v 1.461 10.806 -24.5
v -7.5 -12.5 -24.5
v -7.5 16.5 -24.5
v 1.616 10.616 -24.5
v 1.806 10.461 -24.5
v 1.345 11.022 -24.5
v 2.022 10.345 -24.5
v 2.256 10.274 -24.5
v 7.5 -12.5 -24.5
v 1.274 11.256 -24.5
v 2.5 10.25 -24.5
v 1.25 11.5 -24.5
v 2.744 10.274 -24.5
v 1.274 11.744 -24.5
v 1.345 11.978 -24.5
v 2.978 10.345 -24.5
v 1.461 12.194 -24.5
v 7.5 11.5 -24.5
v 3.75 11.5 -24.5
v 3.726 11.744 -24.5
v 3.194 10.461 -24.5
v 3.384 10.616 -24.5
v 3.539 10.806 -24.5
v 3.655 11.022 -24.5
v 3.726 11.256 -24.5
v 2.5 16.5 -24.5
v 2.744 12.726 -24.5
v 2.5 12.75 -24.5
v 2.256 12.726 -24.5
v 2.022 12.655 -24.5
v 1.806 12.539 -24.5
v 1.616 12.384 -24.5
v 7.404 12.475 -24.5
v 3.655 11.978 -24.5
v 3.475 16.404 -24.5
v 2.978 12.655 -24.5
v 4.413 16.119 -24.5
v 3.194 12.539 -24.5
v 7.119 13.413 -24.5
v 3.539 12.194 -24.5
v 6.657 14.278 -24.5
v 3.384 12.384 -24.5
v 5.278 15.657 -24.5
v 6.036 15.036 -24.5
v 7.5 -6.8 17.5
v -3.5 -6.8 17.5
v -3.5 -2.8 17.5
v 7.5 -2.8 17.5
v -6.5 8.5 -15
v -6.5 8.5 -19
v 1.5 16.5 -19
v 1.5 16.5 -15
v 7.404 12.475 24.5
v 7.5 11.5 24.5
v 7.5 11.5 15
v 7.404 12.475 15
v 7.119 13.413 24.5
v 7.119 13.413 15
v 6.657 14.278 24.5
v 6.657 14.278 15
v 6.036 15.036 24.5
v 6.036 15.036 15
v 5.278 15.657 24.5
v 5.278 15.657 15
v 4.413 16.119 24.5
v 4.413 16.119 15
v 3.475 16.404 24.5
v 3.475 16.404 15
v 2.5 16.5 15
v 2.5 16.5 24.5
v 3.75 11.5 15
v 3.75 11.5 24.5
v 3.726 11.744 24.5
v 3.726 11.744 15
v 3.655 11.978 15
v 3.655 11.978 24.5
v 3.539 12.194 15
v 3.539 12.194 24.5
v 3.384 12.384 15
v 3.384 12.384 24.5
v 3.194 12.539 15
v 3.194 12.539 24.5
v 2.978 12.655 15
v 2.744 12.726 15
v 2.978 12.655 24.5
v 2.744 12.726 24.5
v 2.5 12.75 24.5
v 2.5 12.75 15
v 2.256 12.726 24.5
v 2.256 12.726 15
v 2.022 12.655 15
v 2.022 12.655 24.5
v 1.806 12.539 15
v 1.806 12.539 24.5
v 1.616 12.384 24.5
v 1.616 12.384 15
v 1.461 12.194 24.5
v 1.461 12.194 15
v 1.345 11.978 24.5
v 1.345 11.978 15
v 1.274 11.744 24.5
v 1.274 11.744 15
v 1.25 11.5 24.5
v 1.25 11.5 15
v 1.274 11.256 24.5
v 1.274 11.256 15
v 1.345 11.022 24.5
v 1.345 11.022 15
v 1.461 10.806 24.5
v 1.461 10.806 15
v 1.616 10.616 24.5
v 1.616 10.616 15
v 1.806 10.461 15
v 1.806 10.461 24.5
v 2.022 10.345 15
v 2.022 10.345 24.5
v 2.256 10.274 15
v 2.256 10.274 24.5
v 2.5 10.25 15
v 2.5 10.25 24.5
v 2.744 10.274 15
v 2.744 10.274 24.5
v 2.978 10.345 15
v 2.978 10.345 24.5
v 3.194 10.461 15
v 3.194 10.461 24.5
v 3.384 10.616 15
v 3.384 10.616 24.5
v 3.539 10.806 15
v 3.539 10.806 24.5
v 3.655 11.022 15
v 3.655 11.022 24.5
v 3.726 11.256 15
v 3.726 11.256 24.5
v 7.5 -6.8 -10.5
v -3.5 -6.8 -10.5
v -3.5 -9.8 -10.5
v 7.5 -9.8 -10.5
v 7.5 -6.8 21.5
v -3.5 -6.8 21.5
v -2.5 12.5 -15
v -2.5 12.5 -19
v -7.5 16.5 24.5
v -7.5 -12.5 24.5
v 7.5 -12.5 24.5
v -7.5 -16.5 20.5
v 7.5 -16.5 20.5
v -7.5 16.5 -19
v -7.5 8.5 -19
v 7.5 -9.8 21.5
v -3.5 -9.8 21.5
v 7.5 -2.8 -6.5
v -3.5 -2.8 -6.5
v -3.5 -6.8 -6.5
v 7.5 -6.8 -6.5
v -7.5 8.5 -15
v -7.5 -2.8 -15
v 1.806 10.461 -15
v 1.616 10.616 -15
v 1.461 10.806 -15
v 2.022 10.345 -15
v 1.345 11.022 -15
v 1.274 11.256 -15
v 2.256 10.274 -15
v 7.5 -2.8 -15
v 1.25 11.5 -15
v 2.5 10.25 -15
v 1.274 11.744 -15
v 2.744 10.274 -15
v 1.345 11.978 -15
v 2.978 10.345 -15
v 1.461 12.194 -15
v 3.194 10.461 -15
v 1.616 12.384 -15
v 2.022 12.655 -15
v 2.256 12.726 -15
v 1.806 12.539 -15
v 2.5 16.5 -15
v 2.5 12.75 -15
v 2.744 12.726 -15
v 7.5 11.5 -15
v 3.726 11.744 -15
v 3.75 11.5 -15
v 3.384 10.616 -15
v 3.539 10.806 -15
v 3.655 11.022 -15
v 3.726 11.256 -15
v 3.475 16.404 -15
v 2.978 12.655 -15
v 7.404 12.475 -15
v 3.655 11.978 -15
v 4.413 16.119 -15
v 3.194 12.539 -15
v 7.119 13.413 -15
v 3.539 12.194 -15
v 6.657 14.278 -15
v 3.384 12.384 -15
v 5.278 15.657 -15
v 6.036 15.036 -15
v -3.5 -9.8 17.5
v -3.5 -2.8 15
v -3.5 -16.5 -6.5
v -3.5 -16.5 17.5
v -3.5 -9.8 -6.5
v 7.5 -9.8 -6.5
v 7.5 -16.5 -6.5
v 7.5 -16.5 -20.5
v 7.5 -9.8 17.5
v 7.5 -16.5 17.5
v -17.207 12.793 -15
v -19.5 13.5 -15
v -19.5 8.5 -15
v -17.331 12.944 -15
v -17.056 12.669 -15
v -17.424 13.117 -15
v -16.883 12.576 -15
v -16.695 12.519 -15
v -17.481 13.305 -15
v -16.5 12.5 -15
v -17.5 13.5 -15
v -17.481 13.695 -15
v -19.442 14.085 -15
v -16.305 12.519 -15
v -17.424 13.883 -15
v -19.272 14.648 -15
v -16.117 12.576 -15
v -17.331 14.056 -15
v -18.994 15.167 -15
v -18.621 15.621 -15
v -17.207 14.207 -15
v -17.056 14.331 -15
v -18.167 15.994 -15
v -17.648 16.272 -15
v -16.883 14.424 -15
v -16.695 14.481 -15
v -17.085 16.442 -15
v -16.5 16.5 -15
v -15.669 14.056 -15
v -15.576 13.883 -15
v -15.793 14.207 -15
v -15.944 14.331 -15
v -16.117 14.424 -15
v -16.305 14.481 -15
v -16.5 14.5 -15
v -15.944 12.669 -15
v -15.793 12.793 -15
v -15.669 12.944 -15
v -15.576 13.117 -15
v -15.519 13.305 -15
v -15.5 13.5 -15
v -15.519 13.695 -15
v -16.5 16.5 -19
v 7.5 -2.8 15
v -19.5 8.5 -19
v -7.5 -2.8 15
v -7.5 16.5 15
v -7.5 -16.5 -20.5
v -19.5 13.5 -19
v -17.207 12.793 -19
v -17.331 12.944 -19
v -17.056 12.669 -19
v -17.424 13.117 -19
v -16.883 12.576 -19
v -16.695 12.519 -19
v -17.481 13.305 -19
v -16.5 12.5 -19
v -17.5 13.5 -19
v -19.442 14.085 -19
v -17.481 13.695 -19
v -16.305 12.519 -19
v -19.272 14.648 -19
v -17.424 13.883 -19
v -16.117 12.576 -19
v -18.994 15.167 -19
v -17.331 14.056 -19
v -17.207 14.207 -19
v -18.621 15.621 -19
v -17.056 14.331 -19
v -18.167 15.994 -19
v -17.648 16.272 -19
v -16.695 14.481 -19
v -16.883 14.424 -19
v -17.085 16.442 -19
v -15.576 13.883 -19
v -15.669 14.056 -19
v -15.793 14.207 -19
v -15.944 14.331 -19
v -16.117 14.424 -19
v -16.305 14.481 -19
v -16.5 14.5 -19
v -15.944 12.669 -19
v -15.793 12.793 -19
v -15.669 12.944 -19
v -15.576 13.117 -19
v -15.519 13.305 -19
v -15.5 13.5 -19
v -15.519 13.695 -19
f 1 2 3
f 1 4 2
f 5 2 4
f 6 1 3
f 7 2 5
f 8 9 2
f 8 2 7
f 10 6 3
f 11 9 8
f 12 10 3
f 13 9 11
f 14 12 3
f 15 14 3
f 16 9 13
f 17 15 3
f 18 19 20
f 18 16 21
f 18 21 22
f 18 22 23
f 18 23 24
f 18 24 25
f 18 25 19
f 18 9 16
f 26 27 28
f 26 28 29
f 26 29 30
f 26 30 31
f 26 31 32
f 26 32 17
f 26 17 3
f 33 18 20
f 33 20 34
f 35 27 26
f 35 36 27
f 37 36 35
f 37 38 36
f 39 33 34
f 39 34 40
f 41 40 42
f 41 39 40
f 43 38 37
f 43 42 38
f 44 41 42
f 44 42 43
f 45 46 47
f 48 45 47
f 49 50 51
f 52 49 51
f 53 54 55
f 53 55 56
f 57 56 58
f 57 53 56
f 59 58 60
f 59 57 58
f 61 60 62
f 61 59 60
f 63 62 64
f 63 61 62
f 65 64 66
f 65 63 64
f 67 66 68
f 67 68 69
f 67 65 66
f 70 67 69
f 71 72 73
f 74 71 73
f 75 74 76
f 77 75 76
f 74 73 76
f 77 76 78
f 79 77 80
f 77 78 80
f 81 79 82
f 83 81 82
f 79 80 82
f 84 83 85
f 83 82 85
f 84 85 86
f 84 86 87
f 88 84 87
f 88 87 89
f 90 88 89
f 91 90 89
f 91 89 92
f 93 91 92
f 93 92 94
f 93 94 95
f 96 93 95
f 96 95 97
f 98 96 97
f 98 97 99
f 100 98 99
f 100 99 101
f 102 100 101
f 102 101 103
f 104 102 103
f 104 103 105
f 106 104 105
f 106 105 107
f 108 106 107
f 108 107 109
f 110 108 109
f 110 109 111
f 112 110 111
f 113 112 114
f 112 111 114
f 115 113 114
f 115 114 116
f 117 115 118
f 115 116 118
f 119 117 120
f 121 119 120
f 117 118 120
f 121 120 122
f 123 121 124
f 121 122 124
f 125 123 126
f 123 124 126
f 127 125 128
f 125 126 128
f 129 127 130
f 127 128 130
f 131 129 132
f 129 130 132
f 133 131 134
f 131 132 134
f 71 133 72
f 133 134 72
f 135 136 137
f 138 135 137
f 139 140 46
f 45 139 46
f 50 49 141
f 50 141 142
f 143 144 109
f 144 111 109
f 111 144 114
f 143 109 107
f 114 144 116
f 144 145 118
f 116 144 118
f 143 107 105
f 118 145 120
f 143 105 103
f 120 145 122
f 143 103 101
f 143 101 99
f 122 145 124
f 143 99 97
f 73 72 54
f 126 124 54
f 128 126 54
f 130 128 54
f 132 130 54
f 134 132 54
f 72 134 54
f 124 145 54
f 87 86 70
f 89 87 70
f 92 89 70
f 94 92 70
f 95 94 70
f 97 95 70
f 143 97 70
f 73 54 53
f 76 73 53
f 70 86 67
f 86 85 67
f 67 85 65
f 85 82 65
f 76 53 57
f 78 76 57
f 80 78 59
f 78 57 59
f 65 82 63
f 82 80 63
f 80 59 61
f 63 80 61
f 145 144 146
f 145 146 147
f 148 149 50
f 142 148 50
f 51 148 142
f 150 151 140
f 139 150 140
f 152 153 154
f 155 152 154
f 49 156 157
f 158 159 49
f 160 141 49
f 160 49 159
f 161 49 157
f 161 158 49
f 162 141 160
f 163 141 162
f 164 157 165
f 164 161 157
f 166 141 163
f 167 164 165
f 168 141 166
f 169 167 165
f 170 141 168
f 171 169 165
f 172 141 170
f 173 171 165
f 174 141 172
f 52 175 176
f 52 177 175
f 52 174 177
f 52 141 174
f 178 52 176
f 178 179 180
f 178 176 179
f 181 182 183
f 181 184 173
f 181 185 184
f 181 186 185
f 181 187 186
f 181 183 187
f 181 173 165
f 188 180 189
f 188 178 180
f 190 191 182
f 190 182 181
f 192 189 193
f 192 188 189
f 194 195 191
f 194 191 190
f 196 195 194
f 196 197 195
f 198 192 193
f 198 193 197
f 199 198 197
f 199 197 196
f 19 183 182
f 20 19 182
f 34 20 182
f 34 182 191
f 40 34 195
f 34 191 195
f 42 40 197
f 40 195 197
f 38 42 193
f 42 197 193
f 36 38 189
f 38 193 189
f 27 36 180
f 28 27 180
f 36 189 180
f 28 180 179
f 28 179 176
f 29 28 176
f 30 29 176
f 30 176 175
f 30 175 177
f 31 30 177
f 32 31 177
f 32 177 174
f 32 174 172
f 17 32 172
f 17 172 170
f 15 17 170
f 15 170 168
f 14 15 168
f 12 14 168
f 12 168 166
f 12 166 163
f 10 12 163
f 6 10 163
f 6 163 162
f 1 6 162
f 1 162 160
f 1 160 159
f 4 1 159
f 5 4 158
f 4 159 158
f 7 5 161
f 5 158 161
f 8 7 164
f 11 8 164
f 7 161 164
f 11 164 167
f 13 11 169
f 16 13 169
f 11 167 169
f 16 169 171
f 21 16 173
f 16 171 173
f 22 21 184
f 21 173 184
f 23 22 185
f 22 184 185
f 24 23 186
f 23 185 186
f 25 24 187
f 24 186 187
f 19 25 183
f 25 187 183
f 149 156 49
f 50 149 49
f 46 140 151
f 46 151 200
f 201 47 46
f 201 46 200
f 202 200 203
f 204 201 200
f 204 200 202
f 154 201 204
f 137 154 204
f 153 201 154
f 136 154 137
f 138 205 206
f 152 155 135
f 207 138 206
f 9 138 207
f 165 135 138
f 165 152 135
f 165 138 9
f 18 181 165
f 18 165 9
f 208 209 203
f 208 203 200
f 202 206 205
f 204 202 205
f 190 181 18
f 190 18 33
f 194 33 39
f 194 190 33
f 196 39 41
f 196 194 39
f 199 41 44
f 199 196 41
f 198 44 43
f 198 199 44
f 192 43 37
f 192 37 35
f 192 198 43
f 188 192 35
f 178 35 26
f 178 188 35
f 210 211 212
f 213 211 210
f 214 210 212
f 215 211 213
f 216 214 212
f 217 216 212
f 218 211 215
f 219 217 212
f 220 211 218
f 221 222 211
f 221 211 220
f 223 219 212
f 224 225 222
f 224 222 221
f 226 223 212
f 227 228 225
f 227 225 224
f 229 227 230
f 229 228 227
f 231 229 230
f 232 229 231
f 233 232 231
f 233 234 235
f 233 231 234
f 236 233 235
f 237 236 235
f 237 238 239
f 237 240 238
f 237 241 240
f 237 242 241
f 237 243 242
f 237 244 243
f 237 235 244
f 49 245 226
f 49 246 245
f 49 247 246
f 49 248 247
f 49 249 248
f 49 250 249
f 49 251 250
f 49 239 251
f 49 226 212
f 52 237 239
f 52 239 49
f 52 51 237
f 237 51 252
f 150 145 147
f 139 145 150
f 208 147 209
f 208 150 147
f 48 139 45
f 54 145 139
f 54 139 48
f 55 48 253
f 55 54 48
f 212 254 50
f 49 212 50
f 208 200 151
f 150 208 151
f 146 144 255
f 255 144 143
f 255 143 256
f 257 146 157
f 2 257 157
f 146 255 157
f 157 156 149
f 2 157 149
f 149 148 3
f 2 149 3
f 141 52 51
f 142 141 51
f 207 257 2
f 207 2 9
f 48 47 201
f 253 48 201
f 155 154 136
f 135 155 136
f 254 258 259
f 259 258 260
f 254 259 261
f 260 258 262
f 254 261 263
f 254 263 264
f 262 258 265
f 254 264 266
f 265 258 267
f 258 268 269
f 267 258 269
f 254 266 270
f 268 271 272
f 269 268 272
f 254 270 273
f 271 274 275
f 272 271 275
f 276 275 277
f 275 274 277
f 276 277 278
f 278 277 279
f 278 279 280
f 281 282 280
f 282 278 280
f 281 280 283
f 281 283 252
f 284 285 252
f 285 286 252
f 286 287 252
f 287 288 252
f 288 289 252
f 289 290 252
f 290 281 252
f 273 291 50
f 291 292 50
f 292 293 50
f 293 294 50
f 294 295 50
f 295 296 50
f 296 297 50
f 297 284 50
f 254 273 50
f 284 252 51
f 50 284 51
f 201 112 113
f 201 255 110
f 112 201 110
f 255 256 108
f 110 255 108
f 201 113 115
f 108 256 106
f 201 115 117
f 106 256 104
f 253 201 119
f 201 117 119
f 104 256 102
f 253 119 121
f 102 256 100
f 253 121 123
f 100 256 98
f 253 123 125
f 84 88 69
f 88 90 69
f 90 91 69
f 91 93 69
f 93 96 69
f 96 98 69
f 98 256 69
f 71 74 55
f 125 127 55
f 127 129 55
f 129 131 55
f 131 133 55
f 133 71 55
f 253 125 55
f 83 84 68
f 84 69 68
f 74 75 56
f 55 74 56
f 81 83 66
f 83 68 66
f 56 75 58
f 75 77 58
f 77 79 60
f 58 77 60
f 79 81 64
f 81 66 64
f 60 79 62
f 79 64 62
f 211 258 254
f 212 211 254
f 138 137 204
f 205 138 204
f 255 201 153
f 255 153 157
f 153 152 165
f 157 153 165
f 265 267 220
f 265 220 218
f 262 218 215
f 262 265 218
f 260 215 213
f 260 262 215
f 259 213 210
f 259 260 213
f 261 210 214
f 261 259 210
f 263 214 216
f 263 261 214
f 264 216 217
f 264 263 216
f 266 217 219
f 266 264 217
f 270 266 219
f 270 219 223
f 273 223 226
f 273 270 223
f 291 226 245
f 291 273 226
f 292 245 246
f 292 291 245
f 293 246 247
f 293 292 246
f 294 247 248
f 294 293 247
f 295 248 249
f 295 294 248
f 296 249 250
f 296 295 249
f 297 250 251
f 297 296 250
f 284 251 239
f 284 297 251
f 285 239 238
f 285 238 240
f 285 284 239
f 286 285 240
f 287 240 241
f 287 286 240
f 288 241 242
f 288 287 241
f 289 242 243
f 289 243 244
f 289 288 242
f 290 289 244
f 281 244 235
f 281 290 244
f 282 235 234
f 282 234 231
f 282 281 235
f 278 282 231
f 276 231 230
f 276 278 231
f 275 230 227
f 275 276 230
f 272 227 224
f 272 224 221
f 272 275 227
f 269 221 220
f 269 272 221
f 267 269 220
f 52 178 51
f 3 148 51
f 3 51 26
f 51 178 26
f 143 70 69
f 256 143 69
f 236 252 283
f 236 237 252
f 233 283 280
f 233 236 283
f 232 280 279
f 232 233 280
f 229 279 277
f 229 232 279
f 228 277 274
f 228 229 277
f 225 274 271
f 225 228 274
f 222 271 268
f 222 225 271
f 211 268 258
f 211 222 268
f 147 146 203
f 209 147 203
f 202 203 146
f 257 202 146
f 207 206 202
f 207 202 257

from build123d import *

# Parameters (mm, degrees)
SKETCH1_W           = 49
SKETCH1_H           = 33
BOSS_EXTRUDE1_DEPTH = 7.5
SKETCH2_R           = 1.25
CUT_EXTRUDE1_DEPTH  = 53.244616948
SKETCH3_W           = 24
SKETCH3_H           = 6.7
CUT_EXTRUDE2_DEPTH  = 11
CUT_EXTRUDE3_DEPTH  = 32.519835025
CUT_EXTRUDE4_REACH  = 43.779
SKETCH5_W           = 15
SKETCH5_H           = 30
SKETCH6_W           = 5
SKETCH6_H           = 8
CUT_EXTRUDE5_DEPTH  = 4
CHAMFER1_SIZE       = 4
SKETCH7_R           = 1
BOSS_EXTRUDE2_DEPTH = 4
FILLET1_R           = 3
CHAMFER2_SIZE       = 4


with BuildPart() as part:
    # Sketch1 → Boss-Extrude1 (new, symmetric)
    with BuildSketch(Plane(origin=(0, 0, 0), x_dir=(0, 0, -1), z_dir=(1, 0, 0))):
        Rectangle(SKETCH1_W, SKETCH1_H)
    extrude(amount=BOSS_EXTRUDE1_DEPTH, both=True)

    # Sketch2 → Cut-Extrude1 (cut, through all)
    with BuildSketch(Plane.XY.offset(24.5)):
        with Locations((2.5, 11.5)):
            Circle(SKETCH2_R)
        with BuildLine():
            Line((2.5, 16.5), (7.5, 16.5))
            Line((7.5, 16.5), (7.5, 11.5))
            ThreePointArc((7.5, 11.5), (6.035533906, 15.035533906), (2.5, 16.5))
        make_face()
    extrude(amount=-CUT_EXTRUDE1_DEPTH, mode=Mode.SUBTRACT)

    # Sketch3 → Cut-Extrude2 (cut)
    with BuildSketch(Plane(origin=(7.5, 0, 0), x_dir=(0, 0, -1), z_dir=(1, 0, 0))):
        with Locations((-5.5, -13.15)):
            Rectangle(SKETCH3_W, SKETCH3_H)
    extrude(amount=-CUT_EXTRUDE2_DEPTH, mode=Mode.SUBTRACT)

    # Sketch4 → Cut-Extrude3 (cut, through all)
    with BuildSketch(Plane(origin=(-3.5, 0, 0), x_dir=(0, 0, -1), z_dir=(1, 0, 0))):
        Polygon((6.5, -6.8), (10.5, -6.8), (10.5, -9.8), (-21.5, -9.8), (-21.5, -6.8), (-17.5, -6.8), (-17.5, -2.8), (6.5, -2.8), align=None)
    extrude(amount=CUT_EXTRUDE3_DEPTH, mode=Mode.SUBTRACT)

    # Cut-Extrude4: up to this face of the body (flat: up to its plane)
    cut_extrude4_end = Plane(part.part.faces().sort_by_distance((2, -2.8, 5.5))[0])
    # Sketch5 → Cut-Extrude4 (cut, up to the picked face)
    with BuildSketch(Plane(origin=(0, 16.5, 0), x_dir=(1, 0, 0), z_dir=(0, 1, 0)), mode=Mode.PRIVATE) as cut_extrude4_sk1:
        Rectangle(SKETCH5_W, SKETCH5_H)
    cut_extrude4_tool1 = split(extrude(cut_extrude4_sk1.sketch, amount=-CUT_EXTRUDE4_REACH, mode=Mode.PRIVATE), bisect_by=cut_extrude4_end, keep=Keep.BOTH, mode=Mode.PRIVATE)
    add(cut_extrude4_tool1.solids().sort_by(Axis((0, 16.5, 0), (0, -1, 0)))[0], mode=Mode.SUBTRACT)

    # Sketch6 → Cut-Extrude5 (cut)
    with BuildSketch(Plane.XY.offset(-15)):
        with Locations((-5, 12.5)):
            Rectangle(SKETCH6_W, SKETCH6_H)
    extrude(amount=-CUT_EXTRUDE5_DEPTH, mode=Mode.SUBTRACT)

    # Chamfer1
    chamfer1_edges = [part.edges().sort_by_distance(p)[0] for p in [
        (-2.5, 8.5, -17),
    ]]
    chamfer(chamfer1_edges, length=CHAMFER1_SIZE)
    chamfer1_2_edges = [part.edges().sort_by_distance(p)[0] for p in [
        (-2.5, 16.5, -17),
    ]]
    chamfer(chamfer1_2_edges, length=CHAMFER1_SIZE - 0.0001)  # a hair under: the kernel refuses the full size

    # Chamfer2
    chamfer2_edges = [part.edges().sort_by_distance(p)[0] for p in [
        (0, -16.5, -24.5),
        (0, -16.5, 24.5),
    ]]
    chamfer(chamfer2_edges, length=CHAMFER2_SIZE)


with BuildPart() as body_2:
    # Sketch7 → Boss-Extrude2 (new body)
    with BuildSketch(Plane.XY.offset(-19)):
        Polygon((1.5, 16.5), (-19.5, 16.5), (-19.5, 8.5), (-6.5, 8.5), align=None)
        with Locations(Location((-16.5, 13.5, 0), (0, 0, 180))):
            Circle(SKETCH7_R, mode=Mode.SUBTRACT)
    extrude(amount=BOSS_EXTRUDE2_DEPTH)

    # Fillet1
    fillet1_edges = [body_2.edges().sort_by_distance(p)[0] for p in [
        (-19.5, 16.5, -17),
    ]]
    fillet(fillet1_edges, radius=FILLET1_R)


solid = Compound([part.part, body_2.part])
